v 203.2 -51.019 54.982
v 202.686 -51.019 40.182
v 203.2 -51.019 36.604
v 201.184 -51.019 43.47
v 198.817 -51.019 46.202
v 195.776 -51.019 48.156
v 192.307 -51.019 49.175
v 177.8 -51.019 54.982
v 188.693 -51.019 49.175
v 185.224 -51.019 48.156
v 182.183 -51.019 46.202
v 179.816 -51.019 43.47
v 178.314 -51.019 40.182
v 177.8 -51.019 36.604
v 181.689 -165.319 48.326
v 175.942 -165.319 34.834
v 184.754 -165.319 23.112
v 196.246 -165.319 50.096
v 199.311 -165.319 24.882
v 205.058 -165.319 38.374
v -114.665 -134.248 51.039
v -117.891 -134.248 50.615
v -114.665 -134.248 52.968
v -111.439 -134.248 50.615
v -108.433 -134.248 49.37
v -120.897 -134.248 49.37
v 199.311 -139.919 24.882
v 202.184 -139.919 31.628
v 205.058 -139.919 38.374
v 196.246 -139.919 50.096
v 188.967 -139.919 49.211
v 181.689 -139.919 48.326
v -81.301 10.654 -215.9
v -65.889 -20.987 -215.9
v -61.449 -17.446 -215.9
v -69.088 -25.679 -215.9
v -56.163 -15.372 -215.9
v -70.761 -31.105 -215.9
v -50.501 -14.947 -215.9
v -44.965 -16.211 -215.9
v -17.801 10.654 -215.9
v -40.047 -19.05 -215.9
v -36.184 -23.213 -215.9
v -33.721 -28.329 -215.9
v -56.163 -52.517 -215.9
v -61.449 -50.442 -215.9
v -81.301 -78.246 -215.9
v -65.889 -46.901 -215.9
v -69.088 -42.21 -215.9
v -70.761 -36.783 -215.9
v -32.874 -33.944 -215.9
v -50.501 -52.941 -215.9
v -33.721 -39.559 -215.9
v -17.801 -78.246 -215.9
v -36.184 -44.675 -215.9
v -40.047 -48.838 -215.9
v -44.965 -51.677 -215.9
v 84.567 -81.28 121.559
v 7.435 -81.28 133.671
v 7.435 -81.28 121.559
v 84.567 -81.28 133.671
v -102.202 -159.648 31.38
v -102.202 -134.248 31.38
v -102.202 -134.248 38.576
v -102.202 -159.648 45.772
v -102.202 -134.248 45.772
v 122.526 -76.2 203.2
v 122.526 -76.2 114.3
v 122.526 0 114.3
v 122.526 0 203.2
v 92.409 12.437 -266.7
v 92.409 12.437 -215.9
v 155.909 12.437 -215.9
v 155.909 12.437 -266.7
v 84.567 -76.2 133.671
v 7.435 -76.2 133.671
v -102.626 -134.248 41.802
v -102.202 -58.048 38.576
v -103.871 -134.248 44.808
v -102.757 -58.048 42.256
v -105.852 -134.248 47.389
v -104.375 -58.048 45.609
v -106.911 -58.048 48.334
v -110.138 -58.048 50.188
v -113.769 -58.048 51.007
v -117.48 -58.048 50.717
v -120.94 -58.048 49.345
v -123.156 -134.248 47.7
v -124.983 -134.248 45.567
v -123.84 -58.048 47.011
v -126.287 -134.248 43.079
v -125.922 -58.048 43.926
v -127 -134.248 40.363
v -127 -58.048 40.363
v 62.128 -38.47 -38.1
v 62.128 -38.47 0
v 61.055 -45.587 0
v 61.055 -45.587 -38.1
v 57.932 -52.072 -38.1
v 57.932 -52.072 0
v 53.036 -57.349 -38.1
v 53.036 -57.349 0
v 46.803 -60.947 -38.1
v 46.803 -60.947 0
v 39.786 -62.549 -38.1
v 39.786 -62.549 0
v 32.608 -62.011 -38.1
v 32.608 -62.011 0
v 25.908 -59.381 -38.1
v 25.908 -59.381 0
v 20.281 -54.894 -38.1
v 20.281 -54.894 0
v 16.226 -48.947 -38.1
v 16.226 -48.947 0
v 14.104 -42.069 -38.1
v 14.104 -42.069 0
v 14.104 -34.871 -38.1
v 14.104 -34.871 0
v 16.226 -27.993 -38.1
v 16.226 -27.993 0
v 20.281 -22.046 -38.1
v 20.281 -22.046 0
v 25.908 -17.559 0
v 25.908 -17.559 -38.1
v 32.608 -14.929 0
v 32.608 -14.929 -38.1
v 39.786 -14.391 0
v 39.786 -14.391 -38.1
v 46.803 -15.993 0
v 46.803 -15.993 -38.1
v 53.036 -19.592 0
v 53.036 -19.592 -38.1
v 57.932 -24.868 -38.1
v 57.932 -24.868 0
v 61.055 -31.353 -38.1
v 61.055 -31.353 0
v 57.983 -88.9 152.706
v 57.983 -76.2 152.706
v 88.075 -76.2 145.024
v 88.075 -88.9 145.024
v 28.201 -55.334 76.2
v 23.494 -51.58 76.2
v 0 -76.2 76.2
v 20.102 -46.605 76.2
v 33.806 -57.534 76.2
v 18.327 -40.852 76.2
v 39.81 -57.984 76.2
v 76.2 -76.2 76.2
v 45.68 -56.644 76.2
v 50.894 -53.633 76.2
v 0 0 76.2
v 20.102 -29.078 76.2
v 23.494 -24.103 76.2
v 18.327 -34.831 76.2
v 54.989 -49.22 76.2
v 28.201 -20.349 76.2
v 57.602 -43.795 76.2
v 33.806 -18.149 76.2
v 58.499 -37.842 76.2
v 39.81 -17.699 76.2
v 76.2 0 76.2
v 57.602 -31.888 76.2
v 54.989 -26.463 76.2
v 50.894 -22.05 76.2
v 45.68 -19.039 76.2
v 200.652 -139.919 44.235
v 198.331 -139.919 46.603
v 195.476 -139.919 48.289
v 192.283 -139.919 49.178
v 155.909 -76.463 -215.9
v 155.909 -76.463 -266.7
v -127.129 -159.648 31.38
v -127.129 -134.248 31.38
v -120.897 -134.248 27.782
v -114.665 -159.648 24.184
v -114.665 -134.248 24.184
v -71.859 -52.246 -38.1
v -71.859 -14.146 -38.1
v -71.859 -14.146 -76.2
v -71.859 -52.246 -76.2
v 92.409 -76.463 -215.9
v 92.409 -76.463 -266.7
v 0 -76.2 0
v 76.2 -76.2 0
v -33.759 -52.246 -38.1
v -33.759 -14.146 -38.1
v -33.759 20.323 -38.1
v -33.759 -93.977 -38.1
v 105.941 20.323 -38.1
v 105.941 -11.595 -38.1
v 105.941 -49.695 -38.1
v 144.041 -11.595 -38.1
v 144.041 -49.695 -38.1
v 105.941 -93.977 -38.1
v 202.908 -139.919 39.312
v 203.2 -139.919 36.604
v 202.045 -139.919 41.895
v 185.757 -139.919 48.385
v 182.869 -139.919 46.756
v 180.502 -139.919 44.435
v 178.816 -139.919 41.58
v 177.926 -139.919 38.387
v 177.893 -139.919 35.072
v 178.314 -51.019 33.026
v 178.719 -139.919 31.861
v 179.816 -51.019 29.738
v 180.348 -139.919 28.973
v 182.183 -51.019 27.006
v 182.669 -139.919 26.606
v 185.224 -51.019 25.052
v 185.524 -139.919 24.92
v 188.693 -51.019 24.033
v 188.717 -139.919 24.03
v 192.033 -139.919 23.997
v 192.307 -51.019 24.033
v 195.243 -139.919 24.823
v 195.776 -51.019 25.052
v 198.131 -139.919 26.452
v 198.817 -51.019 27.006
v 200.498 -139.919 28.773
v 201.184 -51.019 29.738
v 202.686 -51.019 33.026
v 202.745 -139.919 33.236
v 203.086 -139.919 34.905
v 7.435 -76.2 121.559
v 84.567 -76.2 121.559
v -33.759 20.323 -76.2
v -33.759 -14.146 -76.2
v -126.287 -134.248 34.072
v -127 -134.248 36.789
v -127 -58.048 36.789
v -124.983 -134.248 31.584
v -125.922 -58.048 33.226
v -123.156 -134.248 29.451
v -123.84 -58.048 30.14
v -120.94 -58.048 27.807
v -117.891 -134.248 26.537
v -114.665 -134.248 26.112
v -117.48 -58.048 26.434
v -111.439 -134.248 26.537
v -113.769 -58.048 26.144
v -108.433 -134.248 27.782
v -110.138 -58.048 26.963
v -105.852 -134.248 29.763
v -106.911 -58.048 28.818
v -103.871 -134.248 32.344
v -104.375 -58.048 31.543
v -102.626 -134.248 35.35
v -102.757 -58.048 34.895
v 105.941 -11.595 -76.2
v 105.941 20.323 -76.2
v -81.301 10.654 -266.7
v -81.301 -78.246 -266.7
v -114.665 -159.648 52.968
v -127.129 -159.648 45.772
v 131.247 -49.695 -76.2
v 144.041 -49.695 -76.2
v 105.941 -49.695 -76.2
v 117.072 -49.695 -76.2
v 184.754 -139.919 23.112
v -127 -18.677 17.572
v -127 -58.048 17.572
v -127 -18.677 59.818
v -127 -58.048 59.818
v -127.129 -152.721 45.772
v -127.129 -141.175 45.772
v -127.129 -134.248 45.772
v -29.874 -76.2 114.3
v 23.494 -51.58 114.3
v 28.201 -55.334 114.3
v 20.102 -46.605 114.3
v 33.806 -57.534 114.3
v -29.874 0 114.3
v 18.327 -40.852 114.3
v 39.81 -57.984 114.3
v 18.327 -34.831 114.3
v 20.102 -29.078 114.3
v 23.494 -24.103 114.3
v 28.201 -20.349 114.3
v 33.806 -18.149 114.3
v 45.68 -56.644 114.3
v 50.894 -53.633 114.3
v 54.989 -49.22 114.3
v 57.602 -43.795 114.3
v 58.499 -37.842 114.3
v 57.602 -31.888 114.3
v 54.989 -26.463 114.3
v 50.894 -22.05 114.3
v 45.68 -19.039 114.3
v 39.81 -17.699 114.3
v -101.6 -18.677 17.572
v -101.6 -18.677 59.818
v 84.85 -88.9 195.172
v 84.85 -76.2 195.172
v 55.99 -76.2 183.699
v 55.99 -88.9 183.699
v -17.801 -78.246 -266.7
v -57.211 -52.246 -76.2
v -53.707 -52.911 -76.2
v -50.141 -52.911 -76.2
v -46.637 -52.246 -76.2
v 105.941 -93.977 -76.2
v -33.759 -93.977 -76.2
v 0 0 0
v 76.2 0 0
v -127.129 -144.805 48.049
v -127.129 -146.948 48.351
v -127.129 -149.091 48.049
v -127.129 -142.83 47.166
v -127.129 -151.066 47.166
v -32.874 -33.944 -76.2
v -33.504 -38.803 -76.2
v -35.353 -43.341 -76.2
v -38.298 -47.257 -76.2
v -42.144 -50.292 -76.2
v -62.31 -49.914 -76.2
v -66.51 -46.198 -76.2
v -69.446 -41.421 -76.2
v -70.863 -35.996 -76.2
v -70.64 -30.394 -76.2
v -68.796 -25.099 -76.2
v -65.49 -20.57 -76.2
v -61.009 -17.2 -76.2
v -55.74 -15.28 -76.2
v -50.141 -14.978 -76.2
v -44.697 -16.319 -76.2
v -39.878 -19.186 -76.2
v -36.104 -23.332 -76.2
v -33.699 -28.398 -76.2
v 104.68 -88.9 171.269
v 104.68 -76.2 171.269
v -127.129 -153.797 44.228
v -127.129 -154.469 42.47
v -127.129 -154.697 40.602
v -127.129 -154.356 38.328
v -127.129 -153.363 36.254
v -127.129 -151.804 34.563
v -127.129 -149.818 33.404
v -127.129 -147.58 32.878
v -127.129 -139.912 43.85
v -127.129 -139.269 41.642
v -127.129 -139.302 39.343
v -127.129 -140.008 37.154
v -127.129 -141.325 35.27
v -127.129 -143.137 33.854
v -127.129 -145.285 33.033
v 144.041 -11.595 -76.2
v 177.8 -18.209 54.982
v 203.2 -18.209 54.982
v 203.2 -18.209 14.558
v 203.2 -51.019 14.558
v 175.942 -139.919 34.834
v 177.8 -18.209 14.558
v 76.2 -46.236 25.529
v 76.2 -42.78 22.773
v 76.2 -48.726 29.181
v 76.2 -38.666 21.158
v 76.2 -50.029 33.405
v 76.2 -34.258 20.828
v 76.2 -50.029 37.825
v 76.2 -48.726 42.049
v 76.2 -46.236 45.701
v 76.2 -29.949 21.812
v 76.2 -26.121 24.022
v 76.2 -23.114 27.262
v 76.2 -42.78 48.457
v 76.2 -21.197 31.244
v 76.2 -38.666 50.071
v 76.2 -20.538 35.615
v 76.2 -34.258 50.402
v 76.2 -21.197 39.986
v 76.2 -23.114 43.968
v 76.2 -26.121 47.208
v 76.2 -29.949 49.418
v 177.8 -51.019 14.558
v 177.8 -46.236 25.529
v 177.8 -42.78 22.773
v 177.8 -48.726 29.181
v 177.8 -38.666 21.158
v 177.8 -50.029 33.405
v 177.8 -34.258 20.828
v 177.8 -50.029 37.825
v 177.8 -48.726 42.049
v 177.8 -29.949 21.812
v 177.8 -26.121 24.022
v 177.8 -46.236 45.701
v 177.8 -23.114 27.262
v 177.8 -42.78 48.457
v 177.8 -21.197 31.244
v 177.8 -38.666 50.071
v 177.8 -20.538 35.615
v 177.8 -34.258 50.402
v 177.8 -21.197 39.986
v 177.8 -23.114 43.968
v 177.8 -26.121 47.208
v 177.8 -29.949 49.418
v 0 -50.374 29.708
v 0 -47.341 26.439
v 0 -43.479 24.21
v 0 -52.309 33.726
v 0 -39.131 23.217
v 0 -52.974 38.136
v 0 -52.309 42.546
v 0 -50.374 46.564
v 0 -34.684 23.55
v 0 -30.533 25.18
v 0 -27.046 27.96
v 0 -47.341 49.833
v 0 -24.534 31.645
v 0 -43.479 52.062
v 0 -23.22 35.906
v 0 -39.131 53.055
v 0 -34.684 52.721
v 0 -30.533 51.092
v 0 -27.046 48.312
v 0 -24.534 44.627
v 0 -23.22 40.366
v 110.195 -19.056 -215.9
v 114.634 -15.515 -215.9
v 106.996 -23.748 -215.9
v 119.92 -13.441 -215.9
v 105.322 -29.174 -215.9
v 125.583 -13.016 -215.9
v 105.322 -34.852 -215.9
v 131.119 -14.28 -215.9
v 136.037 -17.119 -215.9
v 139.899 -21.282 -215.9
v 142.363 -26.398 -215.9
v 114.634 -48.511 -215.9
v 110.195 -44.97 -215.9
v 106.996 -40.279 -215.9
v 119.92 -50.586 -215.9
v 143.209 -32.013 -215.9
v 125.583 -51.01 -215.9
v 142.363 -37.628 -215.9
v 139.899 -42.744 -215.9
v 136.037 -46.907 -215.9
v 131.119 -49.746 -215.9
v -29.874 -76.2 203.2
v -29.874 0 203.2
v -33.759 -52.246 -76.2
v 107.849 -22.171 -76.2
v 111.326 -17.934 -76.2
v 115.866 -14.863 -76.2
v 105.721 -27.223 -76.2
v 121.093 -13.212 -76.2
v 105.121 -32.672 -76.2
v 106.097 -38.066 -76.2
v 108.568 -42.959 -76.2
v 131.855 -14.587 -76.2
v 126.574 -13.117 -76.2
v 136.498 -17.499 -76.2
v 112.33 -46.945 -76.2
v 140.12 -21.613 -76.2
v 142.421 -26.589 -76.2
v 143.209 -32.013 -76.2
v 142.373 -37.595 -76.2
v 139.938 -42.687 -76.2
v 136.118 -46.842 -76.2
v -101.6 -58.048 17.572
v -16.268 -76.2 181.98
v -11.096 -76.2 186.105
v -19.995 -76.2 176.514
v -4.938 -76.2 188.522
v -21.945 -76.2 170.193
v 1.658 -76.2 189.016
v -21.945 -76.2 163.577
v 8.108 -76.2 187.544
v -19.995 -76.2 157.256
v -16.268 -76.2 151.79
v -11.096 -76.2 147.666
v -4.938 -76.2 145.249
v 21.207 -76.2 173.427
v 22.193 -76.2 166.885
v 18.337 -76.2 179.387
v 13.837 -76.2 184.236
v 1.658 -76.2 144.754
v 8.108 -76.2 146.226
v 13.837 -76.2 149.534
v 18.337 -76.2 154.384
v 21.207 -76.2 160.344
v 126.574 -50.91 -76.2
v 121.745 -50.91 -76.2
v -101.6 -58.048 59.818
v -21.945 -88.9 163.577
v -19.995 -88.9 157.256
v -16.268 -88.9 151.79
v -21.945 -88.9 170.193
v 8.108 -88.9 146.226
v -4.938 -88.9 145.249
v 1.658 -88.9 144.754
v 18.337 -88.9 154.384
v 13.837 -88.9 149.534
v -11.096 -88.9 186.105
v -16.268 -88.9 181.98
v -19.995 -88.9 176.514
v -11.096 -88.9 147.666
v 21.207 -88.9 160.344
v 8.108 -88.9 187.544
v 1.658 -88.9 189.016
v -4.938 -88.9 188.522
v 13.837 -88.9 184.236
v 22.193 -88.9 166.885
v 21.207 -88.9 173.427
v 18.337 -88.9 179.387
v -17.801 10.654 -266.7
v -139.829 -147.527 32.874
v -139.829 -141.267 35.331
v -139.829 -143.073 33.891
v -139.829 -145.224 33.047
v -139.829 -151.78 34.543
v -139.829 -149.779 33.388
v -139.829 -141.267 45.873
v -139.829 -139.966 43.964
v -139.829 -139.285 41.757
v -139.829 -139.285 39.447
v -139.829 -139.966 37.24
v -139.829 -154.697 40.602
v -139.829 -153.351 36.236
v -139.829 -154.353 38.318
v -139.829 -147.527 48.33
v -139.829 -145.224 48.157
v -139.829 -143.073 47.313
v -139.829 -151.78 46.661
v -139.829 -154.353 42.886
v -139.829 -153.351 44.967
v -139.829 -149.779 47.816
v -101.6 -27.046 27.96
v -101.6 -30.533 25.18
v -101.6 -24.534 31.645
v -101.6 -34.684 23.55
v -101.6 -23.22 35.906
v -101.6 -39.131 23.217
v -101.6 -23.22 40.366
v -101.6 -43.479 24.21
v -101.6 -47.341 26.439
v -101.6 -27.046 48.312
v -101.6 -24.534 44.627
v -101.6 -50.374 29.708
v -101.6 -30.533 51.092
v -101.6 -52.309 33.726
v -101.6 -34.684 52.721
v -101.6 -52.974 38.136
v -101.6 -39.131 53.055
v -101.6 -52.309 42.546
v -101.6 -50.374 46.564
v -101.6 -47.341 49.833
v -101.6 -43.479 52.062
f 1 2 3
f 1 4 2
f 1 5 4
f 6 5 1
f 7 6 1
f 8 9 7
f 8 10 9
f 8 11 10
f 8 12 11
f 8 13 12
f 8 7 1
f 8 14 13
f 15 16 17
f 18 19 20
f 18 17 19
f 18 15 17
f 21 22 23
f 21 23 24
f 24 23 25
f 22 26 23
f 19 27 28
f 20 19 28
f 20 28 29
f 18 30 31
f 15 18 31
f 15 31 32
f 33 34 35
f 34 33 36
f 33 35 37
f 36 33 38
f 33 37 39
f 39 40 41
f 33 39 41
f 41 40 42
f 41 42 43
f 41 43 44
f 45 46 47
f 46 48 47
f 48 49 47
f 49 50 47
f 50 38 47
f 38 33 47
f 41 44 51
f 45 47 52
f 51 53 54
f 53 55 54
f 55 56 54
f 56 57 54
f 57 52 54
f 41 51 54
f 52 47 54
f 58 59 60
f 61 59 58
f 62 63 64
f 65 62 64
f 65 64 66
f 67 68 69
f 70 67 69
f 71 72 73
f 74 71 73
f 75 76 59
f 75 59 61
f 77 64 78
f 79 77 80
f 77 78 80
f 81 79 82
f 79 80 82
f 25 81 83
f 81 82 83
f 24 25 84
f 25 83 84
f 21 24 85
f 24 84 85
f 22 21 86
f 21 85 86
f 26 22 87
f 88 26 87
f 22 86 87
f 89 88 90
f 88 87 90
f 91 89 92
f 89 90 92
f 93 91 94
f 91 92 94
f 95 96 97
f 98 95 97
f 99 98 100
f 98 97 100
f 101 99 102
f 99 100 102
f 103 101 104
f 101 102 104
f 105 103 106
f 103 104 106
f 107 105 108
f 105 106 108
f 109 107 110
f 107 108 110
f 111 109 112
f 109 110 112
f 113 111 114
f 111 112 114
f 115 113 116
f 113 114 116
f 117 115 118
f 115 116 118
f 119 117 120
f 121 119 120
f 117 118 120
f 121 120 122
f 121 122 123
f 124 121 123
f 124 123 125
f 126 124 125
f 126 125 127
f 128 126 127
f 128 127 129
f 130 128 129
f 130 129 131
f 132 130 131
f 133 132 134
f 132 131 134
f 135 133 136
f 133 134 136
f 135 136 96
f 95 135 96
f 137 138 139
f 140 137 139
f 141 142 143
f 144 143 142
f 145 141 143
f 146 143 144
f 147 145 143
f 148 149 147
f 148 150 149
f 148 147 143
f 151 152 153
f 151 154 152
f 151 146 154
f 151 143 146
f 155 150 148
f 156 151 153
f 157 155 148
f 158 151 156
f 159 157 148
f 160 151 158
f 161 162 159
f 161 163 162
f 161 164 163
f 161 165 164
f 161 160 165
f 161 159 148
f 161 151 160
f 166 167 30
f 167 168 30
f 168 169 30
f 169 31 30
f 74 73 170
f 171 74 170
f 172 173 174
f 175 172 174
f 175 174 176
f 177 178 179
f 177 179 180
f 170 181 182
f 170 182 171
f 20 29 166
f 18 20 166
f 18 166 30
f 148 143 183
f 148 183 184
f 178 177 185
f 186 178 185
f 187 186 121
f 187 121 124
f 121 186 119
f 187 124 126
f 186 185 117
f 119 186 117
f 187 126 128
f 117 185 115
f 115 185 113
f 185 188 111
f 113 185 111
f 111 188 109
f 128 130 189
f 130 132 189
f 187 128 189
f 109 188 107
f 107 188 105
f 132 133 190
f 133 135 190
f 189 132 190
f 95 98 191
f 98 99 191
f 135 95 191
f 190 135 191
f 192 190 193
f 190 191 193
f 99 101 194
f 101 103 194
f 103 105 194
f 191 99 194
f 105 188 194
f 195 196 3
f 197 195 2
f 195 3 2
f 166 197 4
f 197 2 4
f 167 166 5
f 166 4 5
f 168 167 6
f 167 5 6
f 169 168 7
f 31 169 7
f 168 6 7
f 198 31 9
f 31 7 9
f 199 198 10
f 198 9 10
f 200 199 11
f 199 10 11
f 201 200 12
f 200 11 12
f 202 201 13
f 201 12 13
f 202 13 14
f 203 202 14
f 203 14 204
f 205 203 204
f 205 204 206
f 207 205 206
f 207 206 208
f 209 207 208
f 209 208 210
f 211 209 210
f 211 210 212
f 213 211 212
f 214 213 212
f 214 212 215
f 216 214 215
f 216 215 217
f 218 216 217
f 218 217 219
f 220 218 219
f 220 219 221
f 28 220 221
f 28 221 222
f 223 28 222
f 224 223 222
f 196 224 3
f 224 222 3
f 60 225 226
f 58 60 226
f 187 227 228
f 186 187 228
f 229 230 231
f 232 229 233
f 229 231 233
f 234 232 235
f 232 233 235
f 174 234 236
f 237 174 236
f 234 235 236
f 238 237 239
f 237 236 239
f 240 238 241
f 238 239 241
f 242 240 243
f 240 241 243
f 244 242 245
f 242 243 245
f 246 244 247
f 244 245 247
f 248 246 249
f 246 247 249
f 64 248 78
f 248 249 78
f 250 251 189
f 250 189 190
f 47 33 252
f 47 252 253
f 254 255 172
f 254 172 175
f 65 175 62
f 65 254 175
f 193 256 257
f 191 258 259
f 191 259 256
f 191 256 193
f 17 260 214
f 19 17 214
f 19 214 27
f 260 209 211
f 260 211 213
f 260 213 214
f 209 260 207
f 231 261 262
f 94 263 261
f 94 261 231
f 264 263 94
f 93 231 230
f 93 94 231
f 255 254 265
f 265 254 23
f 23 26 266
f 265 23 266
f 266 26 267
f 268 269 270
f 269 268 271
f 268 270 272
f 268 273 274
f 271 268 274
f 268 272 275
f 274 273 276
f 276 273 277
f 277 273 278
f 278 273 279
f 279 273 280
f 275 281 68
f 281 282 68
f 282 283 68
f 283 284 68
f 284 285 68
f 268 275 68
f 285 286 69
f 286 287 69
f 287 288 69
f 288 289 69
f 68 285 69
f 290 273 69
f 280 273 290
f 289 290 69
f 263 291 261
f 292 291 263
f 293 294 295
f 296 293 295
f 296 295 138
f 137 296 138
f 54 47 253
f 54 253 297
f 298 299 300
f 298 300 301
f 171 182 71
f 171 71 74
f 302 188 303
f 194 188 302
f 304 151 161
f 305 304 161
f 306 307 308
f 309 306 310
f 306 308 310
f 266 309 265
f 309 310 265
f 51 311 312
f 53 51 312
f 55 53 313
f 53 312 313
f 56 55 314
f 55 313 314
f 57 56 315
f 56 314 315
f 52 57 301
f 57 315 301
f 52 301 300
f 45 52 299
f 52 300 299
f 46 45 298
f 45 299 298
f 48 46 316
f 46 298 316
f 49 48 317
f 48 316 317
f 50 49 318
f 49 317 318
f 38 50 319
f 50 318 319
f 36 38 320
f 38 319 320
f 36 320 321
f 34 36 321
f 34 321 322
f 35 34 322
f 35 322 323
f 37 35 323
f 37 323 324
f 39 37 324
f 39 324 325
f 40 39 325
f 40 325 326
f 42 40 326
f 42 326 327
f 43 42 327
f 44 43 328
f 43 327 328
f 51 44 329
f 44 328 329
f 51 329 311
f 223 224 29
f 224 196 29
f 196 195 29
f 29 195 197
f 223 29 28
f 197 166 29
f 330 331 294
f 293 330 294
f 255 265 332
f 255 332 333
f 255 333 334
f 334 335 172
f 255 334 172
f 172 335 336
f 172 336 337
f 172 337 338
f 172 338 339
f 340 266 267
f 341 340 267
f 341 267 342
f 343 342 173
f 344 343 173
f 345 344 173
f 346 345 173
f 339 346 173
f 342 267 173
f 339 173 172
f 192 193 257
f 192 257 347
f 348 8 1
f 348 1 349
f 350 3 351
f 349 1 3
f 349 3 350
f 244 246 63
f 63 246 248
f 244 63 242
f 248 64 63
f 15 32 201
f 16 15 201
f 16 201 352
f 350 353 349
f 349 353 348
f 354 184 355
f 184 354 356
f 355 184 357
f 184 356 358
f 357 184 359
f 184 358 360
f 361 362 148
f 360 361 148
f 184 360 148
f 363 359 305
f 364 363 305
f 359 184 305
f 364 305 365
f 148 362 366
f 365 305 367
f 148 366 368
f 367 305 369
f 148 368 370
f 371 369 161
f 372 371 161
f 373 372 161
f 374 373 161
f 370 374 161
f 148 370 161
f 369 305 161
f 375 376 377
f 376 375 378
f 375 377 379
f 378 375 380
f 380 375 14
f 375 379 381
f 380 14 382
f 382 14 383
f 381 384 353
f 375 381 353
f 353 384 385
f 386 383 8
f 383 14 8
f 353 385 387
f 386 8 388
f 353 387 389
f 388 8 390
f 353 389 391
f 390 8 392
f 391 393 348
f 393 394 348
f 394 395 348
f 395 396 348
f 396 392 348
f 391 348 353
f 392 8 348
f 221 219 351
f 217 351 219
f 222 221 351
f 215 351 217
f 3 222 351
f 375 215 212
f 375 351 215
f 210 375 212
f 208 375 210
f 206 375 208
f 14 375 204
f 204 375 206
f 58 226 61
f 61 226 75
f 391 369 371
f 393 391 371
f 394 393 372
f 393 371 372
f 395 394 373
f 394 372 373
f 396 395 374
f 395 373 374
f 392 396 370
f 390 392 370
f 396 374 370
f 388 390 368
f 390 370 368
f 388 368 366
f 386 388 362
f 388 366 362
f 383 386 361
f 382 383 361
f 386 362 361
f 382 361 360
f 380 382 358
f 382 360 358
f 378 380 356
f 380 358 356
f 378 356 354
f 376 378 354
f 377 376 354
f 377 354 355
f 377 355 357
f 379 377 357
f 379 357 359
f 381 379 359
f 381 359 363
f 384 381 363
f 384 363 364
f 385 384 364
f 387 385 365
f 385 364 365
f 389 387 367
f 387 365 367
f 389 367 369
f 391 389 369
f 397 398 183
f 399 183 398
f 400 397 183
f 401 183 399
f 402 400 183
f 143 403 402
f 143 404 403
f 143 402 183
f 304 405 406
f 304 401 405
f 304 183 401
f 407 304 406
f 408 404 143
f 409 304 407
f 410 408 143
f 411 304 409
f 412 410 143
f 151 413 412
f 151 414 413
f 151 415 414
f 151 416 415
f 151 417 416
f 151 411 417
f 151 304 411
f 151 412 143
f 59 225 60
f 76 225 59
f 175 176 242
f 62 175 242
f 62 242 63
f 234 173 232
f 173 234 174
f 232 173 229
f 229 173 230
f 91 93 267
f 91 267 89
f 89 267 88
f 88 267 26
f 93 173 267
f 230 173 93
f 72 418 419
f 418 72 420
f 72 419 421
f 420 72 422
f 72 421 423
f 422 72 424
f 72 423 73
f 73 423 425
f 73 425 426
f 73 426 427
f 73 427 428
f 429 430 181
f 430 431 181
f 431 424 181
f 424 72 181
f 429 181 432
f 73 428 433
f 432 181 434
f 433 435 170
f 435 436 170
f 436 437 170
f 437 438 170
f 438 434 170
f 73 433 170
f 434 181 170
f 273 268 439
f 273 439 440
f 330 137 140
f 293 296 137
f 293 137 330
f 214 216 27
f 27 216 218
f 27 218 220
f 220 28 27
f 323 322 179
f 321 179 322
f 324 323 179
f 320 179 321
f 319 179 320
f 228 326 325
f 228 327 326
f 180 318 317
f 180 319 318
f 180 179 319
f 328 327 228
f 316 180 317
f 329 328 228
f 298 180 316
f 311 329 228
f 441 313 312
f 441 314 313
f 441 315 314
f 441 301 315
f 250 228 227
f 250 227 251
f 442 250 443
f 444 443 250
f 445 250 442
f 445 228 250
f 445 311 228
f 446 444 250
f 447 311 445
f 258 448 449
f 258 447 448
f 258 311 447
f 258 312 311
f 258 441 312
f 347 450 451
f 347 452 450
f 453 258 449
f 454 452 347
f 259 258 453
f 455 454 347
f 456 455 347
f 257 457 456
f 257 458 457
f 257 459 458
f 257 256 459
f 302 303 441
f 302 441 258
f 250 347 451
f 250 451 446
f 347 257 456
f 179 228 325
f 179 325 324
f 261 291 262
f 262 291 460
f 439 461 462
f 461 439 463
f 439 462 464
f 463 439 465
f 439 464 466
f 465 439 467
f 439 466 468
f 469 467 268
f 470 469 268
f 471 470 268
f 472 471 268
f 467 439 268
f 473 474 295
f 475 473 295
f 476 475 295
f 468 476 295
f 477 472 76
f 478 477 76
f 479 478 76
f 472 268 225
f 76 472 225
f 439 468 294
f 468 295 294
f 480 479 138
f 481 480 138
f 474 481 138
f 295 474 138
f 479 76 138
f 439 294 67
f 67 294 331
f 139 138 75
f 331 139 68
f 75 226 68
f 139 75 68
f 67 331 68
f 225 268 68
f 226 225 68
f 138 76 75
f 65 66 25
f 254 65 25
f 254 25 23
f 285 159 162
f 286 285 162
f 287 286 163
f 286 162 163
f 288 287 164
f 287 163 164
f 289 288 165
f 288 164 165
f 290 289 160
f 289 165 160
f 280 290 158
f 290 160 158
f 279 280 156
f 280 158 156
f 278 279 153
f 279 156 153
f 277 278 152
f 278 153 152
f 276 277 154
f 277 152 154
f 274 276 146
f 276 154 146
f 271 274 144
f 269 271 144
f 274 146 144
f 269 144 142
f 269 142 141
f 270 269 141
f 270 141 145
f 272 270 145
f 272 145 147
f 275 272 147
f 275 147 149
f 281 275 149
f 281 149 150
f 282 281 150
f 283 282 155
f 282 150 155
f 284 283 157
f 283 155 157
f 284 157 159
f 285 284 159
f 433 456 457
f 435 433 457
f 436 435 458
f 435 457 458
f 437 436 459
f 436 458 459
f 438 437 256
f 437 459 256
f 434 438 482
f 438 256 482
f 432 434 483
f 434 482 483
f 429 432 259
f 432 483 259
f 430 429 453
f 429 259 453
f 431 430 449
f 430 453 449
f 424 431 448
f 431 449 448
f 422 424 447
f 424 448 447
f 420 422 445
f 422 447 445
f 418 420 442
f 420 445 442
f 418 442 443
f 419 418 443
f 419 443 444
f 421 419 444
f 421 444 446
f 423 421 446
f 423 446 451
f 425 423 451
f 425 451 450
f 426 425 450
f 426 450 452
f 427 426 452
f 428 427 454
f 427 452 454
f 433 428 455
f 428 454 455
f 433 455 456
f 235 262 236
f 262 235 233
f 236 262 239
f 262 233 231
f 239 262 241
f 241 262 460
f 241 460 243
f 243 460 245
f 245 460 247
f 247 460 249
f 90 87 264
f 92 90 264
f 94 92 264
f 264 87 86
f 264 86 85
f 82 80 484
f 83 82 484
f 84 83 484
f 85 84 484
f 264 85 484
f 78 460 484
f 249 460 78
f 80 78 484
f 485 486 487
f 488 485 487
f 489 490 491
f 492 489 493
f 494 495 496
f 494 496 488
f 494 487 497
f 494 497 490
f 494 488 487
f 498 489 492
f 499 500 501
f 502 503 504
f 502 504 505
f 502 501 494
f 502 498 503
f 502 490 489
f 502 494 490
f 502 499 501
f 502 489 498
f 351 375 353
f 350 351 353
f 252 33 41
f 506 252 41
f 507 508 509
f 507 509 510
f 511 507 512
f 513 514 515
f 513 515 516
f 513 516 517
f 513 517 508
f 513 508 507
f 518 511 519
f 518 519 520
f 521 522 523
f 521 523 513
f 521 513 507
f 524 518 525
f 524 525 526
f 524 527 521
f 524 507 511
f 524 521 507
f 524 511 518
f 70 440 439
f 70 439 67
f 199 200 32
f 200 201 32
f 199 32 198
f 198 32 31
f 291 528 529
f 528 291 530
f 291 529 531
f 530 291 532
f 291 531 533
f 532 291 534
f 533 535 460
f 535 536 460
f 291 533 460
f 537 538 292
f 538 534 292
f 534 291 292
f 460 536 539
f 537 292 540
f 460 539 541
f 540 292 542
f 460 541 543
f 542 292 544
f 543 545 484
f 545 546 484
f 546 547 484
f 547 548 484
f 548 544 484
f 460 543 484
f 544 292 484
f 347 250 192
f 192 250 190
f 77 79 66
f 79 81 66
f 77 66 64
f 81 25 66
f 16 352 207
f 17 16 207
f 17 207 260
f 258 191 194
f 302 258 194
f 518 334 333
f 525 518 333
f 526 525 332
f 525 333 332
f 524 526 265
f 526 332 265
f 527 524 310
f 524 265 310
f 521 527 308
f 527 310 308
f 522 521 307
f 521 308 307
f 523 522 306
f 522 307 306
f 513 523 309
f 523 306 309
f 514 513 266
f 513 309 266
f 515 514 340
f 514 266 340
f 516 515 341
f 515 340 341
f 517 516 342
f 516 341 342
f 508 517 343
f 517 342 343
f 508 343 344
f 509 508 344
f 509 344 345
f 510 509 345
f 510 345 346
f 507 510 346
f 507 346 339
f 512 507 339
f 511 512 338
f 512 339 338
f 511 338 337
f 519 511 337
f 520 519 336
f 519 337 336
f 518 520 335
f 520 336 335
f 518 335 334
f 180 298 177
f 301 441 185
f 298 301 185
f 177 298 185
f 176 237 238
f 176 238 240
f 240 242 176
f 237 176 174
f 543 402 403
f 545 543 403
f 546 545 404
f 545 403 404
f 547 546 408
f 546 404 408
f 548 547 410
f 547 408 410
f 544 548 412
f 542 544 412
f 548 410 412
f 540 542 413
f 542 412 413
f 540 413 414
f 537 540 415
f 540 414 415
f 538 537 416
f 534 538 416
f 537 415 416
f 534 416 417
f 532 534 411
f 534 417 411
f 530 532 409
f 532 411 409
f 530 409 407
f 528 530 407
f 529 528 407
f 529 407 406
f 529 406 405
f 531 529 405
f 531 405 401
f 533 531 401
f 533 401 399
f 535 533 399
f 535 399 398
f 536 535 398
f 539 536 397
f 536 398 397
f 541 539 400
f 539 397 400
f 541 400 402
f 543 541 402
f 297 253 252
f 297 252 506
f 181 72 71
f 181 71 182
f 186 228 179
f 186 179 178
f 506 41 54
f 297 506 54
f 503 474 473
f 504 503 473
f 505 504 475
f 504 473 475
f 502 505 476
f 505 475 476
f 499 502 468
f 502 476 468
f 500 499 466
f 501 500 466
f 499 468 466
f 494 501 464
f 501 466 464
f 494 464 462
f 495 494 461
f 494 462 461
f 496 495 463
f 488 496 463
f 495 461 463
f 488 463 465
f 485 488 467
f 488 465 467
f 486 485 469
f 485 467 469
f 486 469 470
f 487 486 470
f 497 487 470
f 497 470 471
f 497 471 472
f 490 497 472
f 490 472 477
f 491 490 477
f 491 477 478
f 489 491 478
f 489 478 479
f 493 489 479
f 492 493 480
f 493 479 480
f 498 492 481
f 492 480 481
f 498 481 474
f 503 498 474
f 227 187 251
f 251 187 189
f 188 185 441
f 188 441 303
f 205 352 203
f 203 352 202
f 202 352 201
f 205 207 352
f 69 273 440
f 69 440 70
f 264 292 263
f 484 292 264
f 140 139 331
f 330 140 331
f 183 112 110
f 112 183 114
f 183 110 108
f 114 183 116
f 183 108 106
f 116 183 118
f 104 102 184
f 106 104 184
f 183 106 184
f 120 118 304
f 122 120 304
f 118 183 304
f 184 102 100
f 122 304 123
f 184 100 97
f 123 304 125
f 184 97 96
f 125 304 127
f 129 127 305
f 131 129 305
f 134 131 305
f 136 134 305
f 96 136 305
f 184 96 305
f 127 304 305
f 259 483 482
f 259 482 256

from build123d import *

# Parameters (mm, degrees)
F0_W      = 76.2
F0_H      = 76.2
F1_DEPTH  = 76.2
F3_R      = 14.8282279676
F4_DEPTH  = 101.6
F5_W      = 32.8097548336
F5_H      = 40.4232954606
F6_DEPTH  = 25.4
F7_R      = 12.7
F8_DEPTH  = 88.9
F10_R     = 14.9606
F11_DEPTH = 101.6
F12_W     = 39.3708851188
F12_H     = 42.2465577722
F13_DEPTH = 25.4
F15_DEPTH = 76.2
F17_DEPTH = 25.4
F19_DEPTH = 25.4
F20_R     = 24.146442962
F21_DEPTH = 38.1
F22_W     = 139.7
F22_H     = 114.3
F23_DEPTH = 38.1
F24_W     = 38.1
F24_H     = 38.1
F25_DEPTH = 38.1
F26_W     = 38.1
F26_H     = 38.1
F27_DEPTH = 38.1
F28_R     = 19.05
F29_DEPTH = 139.7
F30_R     = 19.05
F31_DEPTH = 139.7
F32_W     = 63.5
F32_H     = 88.9
F33_DEPTH = 50.8
F34_W     = 63.5
F34_H     = 88.9
F35_DEPTH = 50.8
F36_R     = 20.1986205594
F37_DEPTH = 38.1
F38_W     = 152.4
F38_H     = 76.2
F39_DEPTH = 88.9
F40_R     = 22.1928241729
F41_DEPTH = 12.7
F43_DEPTH = 12.7
F44_R     = 7.7494009563
F45_DEPTH = 12.7
F46_W     = 77.1328099072
F46_H     = 12.1117681265
F47_DEPTH = 5.08


with BuildPart() as f1:
    # F0 (on Front) → F1 (new body)
    with BuildSketch(Plane.XZ):
        with Locations((38.1, 38.1)):
            Rectangle(F0_W, F0_H)
    extrude(amount=F1_DEPTH)

    # F3 (on face) → F4 (join)
    with BuildSketch(Plane.YZ.offset(76.2)):
        with Locations((-35.3661105037, 35.6148853898)):
            Circle(F3_R)
    extrude(amount=F4_DEPTH)

    # F5 (on face) → F6 (join)
    with BuildSketch(Plane.YZ.offset(177.8)):
        with Locations((-34.6139231697, 34.7698931582)):
            Rectangle(F5_W, F5_H)
    extrude(amount=F6_DEPTH)

    # F7 (on face) → F8 (join)
    with BuildSketch(Plane.XZ.offset(51.0188005865)):
        with Locations((190.5, 36.6041734815)):
            Circle(F7_R)
    extrude(amount=F8_DEPTH)

    # F10 (on face) → F11 (join)
    with BuildSketch(Plane(origin=(0, 0, 0), x_dir=(0, -1, 0), z_dir=(-1, 0, 0))):
        with Locations((38.0133911967, 38.1359569728)):
            Circle(F10_R)
    extrude(amount=F11_DEPTH)

    # F12 (on face) → F13 (join)
    with BuildSketch(Plane(origin=(-101.6, 0, 0), x_dir=(0, -1, 0), z_dir=(-1, 0, 0))):
        with Locations((38.3626231924, 38.6948138475)):
            Rectangle(F12_W, F12_H)
    extrude(amount=F13_DEPTH)

    # F14 (on face) → F15 (join)
    with BuildSketch(Plane.XZ.offset(58.0480657518)):
        with BuildLine():
            ThreePointArc((-127, 36.7887159047), (-113.7693257582, 26.1444457534), (-102.2015897118, 38.5758057237))
            ThreePointArc((-102.2015897118, 38.5758057237), (-113.7693257582, 51.0071656939), (-127, 40.3628955426))
            Line((-127, 40.3628955426), (-127, 36.7887159047))
        make_face()
    extrude(amount=F15_DEPTH)

    # F16 (on face) → F17 (join)
    with BuildSketch(Plane.XZ.offset(134.2480657518)):
        Polygon((-102.2015897118, 31.3799439574), (-102.2015897118, 45.77166749), (-114.6651878953, 52.9675292563), (-127.1287860788, 45.77166749), (-127.1287860788, 31.3799439574), (-114.6651878953, 24.1840821911), align=None)
    extrude(amount=F17_DEPTH)

    # F18 (on face) → F19 (join)
    with BuildSketch(Plane.XZ.offset(139.9188005865)):
        Polygon((199.3113872654, 24.8818534128), (205.0575206035, 38.3738986616), (196.246133338, 50.0962187302), (181.6886127346, 48.3264935501), (175.9424793965, 34.8344483013), (184.753866662, 23.1121282327), align=None)
    extrude(amount=F19_DEPTH)

    # F20 (on face) → F21 (join)
    with BuildSketch(Plane(origin=(0, 0, 0), x_dir=(1, 0, 0), z_dir=(0, 0, -1))):
        with Locations((37.9811637104, 38.4700596333)):
            Circle(F20_R)
    extrude(amount=F21_DEPTH)

    # F22 (on face) → F23 (join)
    with BuildSketch(Plane(origin=(0, 0, -38.1), x_dir=(1, 0, 0), z_dir=(0, 0, -1))):
        with Locations((36.0907144785, 36.826572606)):
            Rectangle(F22_W, F22_H)
    extrude(amount=F23_DEPTH)

    # F24 (on face) → F25 (join)
    with BuildSketch(Plane.YZ.offset(105.9407144785)):
        with Locations((-30.6454657137, -57.15)):
            Rectangle(F24_W, F24_H)
    extrude(amount=F25_DEPTH)

    # F26 (on face) → F27 (join)
    with BuildSketch(Plane(origin=(-33.7592855215, 0, 0), x_dir=(0, -1, 0), z_dir=(-1, 0, 0))):
        with Locations((33.1958828002, -57.15)):
            Rectangle(F26_W, F26_H)
    extrude(amount=F27_DEPTH)

    # F28 (on face) → F29 (join)
    with BuildSketch(Plane(origin=(0, 0, -76.2), x_dir=(1, 0, 0), z_dir=(0, 0, -1))):
        with Locations((124.1594851017, 32.0131704211)):
            Circle(F28_R)
    extrude(amount=F29_DEPTH)

    # F30 (on face) → F31 (join)
    with BuildSketch(Plane(origin=(0, 0, -76.2), x_dir=(1, 0, 0), z_dir=(0, 0, -1))):
        with Locations((-51.9242584705, 33.9441895485)):
            Circle(F30_R)
    extrude(amount=F31_DEPTH)

    # F32 (on face) → F33 (join)
    with BuildSketch(Plane(origin=(0, 0, -215.9), x_dir=(1, 0, 0), z_dir=(0, 0, -1))):
        with Locations((-49.5505024791, 33.7955579877)):
            Rectangle(F32_W, F32_H)
    extrude(amount=F33_DEPTH)

    # F34 (on face) → F35 (join)
    with BuildSketch(Plane(origin=(0, 0, -215.9), x_dir=(1, 0, 0), z_dir=(0, 0, -1))):
        with Locations((124.1594851017, 32.0131704211)):
            Rectangle(F34_W, F34_H)
    extrude(amount=F35_DEPTH)

    # F36 (on face) → F37 (join)
    with BuildSketch(Plane.XY.offset(76.2)):
        with Locations((38.3004583418, -37.8415174782)):
            Circle(F36_R)
    extrude(amount=F37_DEPTH)

    # F38 (on face) → F39 (join)
    with BuildSketch(Plane.XY.offset(114.3)):
        with Locations((46.3255597174, -38.1)):
            Rectangle(F38_W, F38_H)
    extrude(amount=F39_DEPTH)

    # F40 (on face) → F41 (join)
    with BuildSketch(Plane.XZ.offset(76.2)):
        with Locations((0, 166.8851673603)):
            Circle(F40_R)
    extrude(amount=F41_DEPTH)

    # F42 (on face) → F43 (join)
    with BuildSketch(Plane.XZ.offset(76.2)):
        Polygon((88.0750278551, 145.0237293252), (104.6800156515, 171.2694208614), (84.8501031118, 195.172067422), (55.9895553719, 183.6990238813), (57.9826684744, 152.7056464582), align=None)
    extrude(amount=F43_DEPTH)

    # F44 (on face) → F45 (join)
    with BuildSketch(Plane(origin=(-127.1287860788, 0, 0), x_dir=(0, -1, 0), z_dir=(-1, 0, 0))):
        with Locations((146.9480657518, 40.6018458307)):
            Circle(F44_R)
    extrude(amount=F45_DEPTH)

    # F46 (on face) → F47 (join)
    with BuildSketch(Plane.XZ.offset(76.2)):
        with Locations((46.0010524839, 127.6153102517)):
            Rectangle(F46_W, F46_H)
    extrude(amount=F47_DEPTH)


solid = f1.part
